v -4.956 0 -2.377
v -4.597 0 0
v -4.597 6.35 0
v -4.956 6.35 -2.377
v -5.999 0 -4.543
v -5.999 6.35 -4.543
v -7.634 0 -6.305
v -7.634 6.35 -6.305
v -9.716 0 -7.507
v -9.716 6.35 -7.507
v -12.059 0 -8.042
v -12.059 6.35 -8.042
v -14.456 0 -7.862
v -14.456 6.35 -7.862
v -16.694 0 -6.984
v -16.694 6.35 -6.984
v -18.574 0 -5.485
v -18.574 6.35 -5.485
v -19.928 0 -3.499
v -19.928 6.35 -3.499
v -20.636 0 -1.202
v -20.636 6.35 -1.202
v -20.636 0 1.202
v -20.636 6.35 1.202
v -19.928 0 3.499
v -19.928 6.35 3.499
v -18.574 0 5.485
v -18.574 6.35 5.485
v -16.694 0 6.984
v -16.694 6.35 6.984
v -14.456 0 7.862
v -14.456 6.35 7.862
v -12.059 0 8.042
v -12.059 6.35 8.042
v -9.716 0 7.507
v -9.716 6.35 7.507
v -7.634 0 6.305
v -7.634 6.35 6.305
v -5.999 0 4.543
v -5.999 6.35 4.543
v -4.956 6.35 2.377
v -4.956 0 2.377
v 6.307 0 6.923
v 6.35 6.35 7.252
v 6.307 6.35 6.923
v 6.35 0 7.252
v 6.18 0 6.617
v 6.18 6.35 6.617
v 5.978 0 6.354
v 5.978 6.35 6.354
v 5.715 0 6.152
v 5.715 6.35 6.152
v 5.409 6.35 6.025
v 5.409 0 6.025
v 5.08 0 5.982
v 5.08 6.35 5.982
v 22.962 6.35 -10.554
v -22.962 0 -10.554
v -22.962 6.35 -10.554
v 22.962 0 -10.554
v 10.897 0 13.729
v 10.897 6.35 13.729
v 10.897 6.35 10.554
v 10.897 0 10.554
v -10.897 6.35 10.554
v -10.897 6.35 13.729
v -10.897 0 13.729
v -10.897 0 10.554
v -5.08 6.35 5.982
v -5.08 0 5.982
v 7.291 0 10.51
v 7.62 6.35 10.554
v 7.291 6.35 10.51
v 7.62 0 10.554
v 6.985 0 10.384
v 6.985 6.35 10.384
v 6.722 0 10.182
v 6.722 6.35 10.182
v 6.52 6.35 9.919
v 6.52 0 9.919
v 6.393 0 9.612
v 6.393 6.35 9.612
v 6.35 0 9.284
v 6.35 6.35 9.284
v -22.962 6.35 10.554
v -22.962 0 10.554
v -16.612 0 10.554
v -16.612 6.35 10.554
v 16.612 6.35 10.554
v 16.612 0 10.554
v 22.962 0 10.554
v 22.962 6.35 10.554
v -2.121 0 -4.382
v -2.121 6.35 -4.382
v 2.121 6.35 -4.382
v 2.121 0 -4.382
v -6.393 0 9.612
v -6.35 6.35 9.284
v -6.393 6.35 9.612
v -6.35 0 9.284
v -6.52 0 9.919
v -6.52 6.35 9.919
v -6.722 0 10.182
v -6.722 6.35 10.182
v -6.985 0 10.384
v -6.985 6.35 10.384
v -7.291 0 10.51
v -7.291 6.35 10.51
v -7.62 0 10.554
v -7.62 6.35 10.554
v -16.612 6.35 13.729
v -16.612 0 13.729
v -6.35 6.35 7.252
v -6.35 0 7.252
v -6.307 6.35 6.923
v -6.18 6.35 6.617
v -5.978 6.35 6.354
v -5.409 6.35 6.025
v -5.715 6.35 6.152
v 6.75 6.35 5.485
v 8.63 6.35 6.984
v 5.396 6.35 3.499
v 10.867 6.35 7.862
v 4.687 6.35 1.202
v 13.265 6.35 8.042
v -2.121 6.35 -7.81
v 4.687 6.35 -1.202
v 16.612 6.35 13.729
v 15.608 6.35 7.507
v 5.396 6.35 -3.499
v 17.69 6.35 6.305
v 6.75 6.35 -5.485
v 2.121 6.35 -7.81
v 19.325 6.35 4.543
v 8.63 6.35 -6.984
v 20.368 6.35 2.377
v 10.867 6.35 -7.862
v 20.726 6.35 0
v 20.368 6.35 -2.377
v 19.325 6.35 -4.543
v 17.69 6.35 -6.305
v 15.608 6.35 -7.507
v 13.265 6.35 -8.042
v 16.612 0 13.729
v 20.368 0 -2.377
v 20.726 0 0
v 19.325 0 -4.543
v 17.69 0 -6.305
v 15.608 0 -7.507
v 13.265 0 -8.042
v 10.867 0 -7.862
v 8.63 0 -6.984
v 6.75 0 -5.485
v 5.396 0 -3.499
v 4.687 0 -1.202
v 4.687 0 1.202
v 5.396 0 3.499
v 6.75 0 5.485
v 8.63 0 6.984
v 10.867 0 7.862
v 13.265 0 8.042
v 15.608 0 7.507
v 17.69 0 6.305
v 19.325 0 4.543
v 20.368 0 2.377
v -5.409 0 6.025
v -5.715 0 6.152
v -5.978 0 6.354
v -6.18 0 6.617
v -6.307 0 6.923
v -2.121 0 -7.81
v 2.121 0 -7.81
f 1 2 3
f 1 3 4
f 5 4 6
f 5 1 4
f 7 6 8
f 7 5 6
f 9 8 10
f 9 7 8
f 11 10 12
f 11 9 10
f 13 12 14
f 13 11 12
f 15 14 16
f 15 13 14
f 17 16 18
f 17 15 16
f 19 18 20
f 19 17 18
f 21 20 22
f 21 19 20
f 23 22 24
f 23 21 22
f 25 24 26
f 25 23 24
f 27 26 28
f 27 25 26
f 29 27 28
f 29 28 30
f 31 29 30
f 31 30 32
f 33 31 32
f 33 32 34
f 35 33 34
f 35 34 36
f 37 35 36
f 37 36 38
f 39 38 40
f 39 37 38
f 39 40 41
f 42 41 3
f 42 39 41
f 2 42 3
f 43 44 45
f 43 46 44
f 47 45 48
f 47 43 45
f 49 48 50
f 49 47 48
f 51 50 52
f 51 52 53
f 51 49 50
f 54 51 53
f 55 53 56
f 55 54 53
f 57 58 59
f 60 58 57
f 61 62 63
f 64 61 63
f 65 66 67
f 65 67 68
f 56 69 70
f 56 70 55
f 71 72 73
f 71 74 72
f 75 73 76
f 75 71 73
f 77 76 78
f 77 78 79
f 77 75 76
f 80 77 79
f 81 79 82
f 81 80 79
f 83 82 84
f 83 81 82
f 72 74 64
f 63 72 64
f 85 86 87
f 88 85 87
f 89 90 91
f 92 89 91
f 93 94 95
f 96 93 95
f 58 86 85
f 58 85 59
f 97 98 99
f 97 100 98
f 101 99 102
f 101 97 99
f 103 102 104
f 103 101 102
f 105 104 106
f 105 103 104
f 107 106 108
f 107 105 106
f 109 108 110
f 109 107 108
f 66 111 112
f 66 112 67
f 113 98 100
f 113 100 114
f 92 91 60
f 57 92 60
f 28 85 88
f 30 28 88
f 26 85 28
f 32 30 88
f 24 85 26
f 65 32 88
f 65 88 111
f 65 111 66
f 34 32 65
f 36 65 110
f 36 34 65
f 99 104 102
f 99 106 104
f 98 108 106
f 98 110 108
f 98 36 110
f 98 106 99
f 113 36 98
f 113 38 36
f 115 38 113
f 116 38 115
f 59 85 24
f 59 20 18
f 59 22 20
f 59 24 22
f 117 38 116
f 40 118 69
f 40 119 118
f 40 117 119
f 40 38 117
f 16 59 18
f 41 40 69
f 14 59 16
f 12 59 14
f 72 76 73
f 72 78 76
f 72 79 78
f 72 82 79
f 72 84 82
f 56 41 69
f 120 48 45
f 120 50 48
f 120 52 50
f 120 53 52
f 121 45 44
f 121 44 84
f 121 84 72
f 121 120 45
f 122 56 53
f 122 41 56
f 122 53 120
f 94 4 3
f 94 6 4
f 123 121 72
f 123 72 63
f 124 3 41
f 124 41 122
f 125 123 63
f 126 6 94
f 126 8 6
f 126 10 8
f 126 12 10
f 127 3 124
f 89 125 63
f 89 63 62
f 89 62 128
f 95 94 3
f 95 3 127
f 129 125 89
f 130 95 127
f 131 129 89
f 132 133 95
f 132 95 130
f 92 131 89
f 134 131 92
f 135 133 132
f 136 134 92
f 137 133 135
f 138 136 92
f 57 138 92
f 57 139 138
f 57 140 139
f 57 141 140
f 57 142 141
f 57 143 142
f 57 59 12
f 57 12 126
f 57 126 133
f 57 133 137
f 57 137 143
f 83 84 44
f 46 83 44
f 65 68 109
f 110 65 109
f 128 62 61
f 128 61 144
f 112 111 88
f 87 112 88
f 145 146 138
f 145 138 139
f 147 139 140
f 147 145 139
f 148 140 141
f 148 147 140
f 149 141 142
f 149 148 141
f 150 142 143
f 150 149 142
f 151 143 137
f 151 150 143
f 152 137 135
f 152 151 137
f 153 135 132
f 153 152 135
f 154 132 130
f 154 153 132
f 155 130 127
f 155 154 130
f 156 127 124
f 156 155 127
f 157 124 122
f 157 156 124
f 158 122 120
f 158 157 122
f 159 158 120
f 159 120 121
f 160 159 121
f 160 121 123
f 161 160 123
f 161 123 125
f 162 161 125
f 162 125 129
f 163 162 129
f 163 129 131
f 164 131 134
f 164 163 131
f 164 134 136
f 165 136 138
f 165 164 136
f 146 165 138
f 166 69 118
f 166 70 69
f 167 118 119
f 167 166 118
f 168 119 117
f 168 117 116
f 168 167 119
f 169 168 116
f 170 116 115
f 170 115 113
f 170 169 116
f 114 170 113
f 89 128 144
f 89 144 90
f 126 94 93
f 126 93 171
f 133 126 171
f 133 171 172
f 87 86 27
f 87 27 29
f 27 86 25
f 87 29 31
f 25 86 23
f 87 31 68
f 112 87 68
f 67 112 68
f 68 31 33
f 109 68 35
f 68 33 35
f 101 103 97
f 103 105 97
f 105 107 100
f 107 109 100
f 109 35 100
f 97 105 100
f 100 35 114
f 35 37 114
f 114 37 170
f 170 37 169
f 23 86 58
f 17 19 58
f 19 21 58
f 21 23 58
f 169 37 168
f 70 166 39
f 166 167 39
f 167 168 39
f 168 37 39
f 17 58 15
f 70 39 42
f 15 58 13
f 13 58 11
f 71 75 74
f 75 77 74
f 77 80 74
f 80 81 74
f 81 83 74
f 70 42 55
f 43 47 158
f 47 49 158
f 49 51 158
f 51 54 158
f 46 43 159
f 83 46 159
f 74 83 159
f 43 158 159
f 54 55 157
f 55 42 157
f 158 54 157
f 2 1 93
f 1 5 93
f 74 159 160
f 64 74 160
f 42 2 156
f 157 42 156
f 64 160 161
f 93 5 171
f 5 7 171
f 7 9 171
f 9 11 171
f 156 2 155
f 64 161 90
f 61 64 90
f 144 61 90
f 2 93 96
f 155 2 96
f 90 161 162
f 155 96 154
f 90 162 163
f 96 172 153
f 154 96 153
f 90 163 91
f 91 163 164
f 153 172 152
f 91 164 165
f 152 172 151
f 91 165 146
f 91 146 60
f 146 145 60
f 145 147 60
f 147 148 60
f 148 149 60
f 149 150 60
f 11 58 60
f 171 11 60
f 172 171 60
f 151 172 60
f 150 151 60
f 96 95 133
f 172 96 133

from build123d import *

# Parameters (mm, degrees)
SKETCH1_W           = 45.9232
SKETCH1_H           = 21.1074
SKETCH1_R           = 8.0645
BOSS_EXTRUDE1_DEPTH = 6.35
SKETCH2_W           = 4.2418
SKETCH2_H           = 3.429
SKETCH2_W_2         = 12.7
SKETCH2_H_2         = 4.572
CUT_EXTRUDE1_DEPTH  = 6.35
SKETCH4_W           = 5.715
SKETCH4_H           = 3.175
BOSS_EXTRUDE3_DEPTH = 6.35
FILLET1_R           = 1.27


with BuildPart() as part:
    # Sketch1 → Boss-Extrude1 (new body)
    with BuildSketch(Plane(origin=(0, 0, 0), x_dir=(1, 0, 0), z_dir=(0, 1, 0))):
        Rectangle(SKETCH1_W, SKETCH1_H)
        with Locations((-12.6619, 0)):
            Circle(SKETCH1_R, mode=Mode.SUBTRACT)
        with Locations((12.6619, 0)):
            Circle(SKETCH1_R, mode=Mode.SUBTRACT)
    extrude(amount=BOSS_EXTRUDE1_DEPTH)

    # Sketch2 → Cut-Extrude1 (cut)
    with BuildSketch(Plane(origin=(0, 6.35, 0), x_dir=(1, 0, 0), z_dir=(0, 1, 0))):
        with Locations((0, 6.096)):
            Rectangle(SKETCH2_W, SKETCH2_H)
        with Locations((0, -8.2677)):
            Rectangle(SKETCH2_W_2, SKETCH2_H_2)
    extrude(amount=-CUT_EXTRUDE1_DEPTH, mode=Mode.SUBTRACT)

    # Sketch4 → Boss-Extrude3 (add)
    with BuildSketch(Plane(origin=(0, 6.35, 0), x_dir=(1, 0, 0), z_dir=(0, 1, 0))):
        with Locations((-13.7541, -12.1412)):
            Rectangle(SKETCH4_W, SKETCH4_H)
        with Locations((13.7541, -12.1412)):
            Rectangle(SKETCH4_W, SKETCH4_H)
    extrude(amount=-BOSS_EXTRUDE3_DEPTH)

    # Fillet1
    fillet1_edges = [part.edges().sort_by_distance(p)[0] for p in [
        (-6.35, 3.175, 10.5537),
        (-6.35, 3.175, 5.9817),
        (6.35, 3.175, 5.9817),
        (6.35, 3.175, 10.5537),
    ]]
    fillet(fillet1_edges, radius=FILLET1_R)


solid = part.part
